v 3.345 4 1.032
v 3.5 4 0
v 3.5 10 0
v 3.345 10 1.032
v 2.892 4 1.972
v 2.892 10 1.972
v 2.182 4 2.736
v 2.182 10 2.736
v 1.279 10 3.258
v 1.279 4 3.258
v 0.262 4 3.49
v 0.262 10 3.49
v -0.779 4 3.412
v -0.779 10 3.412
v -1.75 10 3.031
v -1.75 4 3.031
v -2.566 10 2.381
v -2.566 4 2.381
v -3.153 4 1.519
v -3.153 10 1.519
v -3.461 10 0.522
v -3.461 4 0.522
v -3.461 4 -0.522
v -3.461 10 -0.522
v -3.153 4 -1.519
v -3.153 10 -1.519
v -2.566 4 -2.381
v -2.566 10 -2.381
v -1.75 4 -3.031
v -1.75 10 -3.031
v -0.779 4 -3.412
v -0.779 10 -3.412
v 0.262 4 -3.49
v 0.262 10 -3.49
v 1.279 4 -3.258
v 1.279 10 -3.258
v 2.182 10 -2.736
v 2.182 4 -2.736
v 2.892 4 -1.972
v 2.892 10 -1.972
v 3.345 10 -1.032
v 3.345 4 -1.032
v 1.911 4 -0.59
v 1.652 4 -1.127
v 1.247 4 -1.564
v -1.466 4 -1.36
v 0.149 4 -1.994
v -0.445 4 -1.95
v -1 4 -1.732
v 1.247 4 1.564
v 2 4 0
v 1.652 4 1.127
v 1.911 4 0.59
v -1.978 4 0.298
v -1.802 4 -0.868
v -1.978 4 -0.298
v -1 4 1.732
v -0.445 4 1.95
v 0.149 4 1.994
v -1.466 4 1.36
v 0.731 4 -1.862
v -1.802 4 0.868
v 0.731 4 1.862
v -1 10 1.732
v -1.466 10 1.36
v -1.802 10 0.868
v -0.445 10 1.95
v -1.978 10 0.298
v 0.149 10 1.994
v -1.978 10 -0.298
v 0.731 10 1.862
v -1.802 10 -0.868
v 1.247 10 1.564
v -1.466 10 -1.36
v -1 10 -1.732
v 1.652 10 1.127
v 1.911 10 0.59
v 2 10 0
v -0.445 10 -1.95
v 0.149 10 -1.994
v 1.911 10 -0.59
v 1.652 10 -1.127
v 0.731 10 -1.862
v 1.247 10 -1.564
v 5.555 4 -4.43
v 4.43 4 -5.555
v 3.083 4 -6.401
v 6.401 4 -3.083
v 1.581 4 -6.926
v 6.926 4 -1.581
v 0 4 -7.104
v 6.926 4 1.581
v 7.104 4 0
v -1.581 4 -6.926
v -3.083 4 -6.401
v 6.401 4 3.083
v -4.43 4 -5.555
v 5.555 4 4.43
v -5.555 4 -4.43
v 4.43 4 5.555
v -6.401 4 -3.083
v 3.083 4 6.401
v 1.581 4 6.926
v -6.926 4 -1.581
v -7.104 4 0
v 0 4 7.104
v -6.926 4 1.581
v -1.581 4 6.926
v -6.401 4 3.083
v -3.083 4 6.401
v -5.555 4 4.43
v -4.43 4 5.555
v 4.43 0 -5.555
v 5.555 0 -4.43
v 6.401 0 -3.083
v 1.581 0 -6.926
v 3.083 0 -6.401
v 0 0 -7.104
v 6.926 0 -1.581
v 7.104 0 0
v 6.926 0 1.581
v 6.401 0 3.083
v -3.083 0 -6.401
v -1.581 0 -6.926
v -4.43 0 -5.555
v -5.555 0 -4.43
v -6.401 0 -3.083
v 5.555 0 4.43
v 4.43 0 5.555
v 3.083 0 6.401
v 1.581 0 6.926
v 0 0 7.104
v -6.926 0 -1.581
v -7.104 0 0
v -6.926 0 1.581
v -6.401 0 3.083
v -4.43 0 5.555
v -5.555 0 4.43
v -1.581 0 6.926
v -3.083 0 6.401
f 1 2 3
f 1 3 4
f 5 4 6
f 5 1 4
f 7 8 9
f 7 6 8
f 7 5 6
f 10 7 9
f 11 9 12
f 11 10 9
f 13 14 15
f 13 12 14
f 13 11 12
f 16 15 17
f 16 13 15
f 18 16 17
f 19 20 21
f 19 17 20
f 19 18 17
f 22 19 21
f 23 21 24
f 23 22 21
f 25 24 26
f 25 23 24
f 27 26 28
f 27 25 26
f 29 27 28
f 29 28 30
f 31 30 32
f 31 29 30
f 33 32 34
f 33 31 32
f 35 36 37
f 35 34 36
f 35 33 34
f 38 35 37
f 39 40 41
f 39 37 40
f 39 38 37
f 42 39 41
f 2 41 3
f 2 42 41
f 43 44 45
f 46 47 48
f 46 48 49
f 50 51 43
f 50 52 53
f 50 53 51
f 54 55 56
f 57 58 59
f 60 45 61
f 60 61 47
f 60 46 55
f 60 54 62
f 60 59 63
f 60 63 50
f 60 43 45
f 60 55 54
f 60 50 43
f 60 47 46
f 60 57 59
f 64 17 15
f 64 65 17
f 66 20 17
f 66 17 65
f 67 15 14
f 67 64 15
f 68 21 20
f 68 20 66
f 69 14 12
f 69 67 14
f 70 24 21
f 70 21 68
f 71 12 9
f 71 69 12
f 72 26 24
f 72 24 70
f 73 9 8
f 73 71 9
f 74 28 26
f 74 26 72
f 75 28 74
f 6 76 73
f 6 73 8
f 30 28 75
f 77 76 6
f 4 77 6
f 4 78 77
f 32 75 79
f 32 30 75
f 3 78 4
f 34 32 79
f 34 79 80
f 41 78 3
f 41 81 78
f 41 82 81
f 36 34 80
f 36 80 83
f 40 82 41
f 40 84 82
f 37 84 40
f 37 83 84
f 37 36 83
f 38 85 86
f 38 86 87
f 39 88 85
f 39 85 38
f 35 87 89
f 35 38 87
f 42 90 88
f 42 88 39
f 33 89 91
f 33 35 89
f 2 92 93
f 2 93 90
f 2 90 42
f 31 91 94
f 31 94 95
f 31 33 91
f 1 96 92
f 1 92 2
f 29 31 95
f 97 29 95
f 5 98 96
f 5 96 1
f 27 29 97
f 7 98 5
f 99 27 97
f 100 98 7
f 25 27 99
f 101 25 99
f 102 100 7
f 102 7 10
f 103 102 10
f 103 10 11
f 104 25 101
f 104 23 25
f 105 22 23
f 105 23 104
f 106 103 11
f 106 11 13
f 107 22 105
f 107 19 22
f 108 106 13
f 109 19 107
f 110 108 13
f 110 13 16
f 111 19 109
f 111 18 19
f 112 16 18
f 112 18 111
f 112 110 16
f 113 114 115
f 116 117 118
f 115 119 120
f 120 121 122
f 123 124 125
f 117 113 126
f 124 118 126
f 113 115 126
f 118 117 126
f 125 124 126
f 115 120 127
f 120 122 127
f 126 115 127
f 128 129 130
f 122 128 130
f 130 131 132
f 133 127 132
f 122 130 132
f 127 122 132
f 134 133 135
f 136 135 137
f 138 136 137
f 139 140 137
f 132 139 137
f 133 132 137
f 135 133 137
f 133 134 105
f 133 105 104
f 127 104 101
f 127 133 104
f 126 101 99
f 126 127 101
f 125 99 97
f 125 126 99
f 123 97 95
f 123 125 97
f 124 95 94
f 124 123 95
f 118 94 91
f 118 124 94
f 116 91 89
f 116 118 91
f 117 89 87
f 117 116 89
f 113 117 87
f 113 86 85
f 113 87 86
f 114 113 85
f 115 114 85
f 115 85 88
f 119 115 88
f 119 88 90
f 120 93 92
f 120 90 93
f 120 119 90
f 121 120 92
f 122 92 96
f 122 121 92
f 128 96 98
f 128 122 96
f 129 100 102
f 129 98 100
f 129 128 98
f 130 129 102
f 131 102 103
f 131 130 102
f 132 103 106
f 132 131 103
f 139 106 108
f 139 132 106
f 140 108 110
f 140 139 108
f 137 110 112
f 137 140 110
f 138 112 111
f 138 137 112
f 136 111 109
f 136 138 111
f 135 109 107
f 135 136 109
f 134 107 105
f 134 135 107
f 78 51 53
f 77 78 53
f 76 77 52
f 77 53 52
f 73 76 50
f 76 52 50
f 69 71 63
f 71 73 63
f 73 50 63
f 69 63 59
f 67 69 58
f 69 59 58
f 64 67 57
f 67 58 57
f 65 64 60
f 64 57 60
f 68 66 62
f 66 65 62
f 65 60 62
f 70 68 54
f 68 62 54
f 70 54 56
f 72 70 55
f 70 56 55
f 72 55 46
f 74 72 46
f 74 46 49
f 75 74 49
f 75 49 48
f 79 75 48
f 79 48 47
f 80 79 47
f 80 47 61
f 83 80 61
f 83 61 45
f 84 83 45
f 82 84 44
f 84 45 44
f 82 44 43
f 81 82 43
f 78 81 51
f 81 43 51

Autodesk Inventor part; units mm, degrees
ref_plane "YZ Plane" through (0, 0, 0) normal (1, 0, 0) x (0, 1, 0)
ref_plane "XZ Plane" through (0, 0, 0) normal (0, 1, 0) x (-1, 0, 0)
ref_plane "XY Plane" through (0, 0, 0) normal (0, 0, 1) x (1, 0, 0)
sketch "Sketch1" plane through (0, 0, 0) normal (0, 1, 0) x (-1, 0, 0)
  circle A0 centre (0, 0) radius 7.1045
  dimension "d0" = 14.209
extrude "Extrusion1" add sketch "Sketch1" along normal blind 4
sketch "Sketch2" plane through (0, 4, 0) normal (0, 1, 0) x (1, 0, 0)
  circle A0 centre (0, 0) radius 7.1045 projected
  circle A1 centre (0, 0) radius 3.5
  circle A2 centre (0, 0) radius 2
  dimension "d3" = 7
  dimension "d4" = 4
extrude "Extrusion2" add sketch "Sketch2" along normal blind 6 contours A1
properties part number "ozubene_kolecko_otaceni_ramene_male"
